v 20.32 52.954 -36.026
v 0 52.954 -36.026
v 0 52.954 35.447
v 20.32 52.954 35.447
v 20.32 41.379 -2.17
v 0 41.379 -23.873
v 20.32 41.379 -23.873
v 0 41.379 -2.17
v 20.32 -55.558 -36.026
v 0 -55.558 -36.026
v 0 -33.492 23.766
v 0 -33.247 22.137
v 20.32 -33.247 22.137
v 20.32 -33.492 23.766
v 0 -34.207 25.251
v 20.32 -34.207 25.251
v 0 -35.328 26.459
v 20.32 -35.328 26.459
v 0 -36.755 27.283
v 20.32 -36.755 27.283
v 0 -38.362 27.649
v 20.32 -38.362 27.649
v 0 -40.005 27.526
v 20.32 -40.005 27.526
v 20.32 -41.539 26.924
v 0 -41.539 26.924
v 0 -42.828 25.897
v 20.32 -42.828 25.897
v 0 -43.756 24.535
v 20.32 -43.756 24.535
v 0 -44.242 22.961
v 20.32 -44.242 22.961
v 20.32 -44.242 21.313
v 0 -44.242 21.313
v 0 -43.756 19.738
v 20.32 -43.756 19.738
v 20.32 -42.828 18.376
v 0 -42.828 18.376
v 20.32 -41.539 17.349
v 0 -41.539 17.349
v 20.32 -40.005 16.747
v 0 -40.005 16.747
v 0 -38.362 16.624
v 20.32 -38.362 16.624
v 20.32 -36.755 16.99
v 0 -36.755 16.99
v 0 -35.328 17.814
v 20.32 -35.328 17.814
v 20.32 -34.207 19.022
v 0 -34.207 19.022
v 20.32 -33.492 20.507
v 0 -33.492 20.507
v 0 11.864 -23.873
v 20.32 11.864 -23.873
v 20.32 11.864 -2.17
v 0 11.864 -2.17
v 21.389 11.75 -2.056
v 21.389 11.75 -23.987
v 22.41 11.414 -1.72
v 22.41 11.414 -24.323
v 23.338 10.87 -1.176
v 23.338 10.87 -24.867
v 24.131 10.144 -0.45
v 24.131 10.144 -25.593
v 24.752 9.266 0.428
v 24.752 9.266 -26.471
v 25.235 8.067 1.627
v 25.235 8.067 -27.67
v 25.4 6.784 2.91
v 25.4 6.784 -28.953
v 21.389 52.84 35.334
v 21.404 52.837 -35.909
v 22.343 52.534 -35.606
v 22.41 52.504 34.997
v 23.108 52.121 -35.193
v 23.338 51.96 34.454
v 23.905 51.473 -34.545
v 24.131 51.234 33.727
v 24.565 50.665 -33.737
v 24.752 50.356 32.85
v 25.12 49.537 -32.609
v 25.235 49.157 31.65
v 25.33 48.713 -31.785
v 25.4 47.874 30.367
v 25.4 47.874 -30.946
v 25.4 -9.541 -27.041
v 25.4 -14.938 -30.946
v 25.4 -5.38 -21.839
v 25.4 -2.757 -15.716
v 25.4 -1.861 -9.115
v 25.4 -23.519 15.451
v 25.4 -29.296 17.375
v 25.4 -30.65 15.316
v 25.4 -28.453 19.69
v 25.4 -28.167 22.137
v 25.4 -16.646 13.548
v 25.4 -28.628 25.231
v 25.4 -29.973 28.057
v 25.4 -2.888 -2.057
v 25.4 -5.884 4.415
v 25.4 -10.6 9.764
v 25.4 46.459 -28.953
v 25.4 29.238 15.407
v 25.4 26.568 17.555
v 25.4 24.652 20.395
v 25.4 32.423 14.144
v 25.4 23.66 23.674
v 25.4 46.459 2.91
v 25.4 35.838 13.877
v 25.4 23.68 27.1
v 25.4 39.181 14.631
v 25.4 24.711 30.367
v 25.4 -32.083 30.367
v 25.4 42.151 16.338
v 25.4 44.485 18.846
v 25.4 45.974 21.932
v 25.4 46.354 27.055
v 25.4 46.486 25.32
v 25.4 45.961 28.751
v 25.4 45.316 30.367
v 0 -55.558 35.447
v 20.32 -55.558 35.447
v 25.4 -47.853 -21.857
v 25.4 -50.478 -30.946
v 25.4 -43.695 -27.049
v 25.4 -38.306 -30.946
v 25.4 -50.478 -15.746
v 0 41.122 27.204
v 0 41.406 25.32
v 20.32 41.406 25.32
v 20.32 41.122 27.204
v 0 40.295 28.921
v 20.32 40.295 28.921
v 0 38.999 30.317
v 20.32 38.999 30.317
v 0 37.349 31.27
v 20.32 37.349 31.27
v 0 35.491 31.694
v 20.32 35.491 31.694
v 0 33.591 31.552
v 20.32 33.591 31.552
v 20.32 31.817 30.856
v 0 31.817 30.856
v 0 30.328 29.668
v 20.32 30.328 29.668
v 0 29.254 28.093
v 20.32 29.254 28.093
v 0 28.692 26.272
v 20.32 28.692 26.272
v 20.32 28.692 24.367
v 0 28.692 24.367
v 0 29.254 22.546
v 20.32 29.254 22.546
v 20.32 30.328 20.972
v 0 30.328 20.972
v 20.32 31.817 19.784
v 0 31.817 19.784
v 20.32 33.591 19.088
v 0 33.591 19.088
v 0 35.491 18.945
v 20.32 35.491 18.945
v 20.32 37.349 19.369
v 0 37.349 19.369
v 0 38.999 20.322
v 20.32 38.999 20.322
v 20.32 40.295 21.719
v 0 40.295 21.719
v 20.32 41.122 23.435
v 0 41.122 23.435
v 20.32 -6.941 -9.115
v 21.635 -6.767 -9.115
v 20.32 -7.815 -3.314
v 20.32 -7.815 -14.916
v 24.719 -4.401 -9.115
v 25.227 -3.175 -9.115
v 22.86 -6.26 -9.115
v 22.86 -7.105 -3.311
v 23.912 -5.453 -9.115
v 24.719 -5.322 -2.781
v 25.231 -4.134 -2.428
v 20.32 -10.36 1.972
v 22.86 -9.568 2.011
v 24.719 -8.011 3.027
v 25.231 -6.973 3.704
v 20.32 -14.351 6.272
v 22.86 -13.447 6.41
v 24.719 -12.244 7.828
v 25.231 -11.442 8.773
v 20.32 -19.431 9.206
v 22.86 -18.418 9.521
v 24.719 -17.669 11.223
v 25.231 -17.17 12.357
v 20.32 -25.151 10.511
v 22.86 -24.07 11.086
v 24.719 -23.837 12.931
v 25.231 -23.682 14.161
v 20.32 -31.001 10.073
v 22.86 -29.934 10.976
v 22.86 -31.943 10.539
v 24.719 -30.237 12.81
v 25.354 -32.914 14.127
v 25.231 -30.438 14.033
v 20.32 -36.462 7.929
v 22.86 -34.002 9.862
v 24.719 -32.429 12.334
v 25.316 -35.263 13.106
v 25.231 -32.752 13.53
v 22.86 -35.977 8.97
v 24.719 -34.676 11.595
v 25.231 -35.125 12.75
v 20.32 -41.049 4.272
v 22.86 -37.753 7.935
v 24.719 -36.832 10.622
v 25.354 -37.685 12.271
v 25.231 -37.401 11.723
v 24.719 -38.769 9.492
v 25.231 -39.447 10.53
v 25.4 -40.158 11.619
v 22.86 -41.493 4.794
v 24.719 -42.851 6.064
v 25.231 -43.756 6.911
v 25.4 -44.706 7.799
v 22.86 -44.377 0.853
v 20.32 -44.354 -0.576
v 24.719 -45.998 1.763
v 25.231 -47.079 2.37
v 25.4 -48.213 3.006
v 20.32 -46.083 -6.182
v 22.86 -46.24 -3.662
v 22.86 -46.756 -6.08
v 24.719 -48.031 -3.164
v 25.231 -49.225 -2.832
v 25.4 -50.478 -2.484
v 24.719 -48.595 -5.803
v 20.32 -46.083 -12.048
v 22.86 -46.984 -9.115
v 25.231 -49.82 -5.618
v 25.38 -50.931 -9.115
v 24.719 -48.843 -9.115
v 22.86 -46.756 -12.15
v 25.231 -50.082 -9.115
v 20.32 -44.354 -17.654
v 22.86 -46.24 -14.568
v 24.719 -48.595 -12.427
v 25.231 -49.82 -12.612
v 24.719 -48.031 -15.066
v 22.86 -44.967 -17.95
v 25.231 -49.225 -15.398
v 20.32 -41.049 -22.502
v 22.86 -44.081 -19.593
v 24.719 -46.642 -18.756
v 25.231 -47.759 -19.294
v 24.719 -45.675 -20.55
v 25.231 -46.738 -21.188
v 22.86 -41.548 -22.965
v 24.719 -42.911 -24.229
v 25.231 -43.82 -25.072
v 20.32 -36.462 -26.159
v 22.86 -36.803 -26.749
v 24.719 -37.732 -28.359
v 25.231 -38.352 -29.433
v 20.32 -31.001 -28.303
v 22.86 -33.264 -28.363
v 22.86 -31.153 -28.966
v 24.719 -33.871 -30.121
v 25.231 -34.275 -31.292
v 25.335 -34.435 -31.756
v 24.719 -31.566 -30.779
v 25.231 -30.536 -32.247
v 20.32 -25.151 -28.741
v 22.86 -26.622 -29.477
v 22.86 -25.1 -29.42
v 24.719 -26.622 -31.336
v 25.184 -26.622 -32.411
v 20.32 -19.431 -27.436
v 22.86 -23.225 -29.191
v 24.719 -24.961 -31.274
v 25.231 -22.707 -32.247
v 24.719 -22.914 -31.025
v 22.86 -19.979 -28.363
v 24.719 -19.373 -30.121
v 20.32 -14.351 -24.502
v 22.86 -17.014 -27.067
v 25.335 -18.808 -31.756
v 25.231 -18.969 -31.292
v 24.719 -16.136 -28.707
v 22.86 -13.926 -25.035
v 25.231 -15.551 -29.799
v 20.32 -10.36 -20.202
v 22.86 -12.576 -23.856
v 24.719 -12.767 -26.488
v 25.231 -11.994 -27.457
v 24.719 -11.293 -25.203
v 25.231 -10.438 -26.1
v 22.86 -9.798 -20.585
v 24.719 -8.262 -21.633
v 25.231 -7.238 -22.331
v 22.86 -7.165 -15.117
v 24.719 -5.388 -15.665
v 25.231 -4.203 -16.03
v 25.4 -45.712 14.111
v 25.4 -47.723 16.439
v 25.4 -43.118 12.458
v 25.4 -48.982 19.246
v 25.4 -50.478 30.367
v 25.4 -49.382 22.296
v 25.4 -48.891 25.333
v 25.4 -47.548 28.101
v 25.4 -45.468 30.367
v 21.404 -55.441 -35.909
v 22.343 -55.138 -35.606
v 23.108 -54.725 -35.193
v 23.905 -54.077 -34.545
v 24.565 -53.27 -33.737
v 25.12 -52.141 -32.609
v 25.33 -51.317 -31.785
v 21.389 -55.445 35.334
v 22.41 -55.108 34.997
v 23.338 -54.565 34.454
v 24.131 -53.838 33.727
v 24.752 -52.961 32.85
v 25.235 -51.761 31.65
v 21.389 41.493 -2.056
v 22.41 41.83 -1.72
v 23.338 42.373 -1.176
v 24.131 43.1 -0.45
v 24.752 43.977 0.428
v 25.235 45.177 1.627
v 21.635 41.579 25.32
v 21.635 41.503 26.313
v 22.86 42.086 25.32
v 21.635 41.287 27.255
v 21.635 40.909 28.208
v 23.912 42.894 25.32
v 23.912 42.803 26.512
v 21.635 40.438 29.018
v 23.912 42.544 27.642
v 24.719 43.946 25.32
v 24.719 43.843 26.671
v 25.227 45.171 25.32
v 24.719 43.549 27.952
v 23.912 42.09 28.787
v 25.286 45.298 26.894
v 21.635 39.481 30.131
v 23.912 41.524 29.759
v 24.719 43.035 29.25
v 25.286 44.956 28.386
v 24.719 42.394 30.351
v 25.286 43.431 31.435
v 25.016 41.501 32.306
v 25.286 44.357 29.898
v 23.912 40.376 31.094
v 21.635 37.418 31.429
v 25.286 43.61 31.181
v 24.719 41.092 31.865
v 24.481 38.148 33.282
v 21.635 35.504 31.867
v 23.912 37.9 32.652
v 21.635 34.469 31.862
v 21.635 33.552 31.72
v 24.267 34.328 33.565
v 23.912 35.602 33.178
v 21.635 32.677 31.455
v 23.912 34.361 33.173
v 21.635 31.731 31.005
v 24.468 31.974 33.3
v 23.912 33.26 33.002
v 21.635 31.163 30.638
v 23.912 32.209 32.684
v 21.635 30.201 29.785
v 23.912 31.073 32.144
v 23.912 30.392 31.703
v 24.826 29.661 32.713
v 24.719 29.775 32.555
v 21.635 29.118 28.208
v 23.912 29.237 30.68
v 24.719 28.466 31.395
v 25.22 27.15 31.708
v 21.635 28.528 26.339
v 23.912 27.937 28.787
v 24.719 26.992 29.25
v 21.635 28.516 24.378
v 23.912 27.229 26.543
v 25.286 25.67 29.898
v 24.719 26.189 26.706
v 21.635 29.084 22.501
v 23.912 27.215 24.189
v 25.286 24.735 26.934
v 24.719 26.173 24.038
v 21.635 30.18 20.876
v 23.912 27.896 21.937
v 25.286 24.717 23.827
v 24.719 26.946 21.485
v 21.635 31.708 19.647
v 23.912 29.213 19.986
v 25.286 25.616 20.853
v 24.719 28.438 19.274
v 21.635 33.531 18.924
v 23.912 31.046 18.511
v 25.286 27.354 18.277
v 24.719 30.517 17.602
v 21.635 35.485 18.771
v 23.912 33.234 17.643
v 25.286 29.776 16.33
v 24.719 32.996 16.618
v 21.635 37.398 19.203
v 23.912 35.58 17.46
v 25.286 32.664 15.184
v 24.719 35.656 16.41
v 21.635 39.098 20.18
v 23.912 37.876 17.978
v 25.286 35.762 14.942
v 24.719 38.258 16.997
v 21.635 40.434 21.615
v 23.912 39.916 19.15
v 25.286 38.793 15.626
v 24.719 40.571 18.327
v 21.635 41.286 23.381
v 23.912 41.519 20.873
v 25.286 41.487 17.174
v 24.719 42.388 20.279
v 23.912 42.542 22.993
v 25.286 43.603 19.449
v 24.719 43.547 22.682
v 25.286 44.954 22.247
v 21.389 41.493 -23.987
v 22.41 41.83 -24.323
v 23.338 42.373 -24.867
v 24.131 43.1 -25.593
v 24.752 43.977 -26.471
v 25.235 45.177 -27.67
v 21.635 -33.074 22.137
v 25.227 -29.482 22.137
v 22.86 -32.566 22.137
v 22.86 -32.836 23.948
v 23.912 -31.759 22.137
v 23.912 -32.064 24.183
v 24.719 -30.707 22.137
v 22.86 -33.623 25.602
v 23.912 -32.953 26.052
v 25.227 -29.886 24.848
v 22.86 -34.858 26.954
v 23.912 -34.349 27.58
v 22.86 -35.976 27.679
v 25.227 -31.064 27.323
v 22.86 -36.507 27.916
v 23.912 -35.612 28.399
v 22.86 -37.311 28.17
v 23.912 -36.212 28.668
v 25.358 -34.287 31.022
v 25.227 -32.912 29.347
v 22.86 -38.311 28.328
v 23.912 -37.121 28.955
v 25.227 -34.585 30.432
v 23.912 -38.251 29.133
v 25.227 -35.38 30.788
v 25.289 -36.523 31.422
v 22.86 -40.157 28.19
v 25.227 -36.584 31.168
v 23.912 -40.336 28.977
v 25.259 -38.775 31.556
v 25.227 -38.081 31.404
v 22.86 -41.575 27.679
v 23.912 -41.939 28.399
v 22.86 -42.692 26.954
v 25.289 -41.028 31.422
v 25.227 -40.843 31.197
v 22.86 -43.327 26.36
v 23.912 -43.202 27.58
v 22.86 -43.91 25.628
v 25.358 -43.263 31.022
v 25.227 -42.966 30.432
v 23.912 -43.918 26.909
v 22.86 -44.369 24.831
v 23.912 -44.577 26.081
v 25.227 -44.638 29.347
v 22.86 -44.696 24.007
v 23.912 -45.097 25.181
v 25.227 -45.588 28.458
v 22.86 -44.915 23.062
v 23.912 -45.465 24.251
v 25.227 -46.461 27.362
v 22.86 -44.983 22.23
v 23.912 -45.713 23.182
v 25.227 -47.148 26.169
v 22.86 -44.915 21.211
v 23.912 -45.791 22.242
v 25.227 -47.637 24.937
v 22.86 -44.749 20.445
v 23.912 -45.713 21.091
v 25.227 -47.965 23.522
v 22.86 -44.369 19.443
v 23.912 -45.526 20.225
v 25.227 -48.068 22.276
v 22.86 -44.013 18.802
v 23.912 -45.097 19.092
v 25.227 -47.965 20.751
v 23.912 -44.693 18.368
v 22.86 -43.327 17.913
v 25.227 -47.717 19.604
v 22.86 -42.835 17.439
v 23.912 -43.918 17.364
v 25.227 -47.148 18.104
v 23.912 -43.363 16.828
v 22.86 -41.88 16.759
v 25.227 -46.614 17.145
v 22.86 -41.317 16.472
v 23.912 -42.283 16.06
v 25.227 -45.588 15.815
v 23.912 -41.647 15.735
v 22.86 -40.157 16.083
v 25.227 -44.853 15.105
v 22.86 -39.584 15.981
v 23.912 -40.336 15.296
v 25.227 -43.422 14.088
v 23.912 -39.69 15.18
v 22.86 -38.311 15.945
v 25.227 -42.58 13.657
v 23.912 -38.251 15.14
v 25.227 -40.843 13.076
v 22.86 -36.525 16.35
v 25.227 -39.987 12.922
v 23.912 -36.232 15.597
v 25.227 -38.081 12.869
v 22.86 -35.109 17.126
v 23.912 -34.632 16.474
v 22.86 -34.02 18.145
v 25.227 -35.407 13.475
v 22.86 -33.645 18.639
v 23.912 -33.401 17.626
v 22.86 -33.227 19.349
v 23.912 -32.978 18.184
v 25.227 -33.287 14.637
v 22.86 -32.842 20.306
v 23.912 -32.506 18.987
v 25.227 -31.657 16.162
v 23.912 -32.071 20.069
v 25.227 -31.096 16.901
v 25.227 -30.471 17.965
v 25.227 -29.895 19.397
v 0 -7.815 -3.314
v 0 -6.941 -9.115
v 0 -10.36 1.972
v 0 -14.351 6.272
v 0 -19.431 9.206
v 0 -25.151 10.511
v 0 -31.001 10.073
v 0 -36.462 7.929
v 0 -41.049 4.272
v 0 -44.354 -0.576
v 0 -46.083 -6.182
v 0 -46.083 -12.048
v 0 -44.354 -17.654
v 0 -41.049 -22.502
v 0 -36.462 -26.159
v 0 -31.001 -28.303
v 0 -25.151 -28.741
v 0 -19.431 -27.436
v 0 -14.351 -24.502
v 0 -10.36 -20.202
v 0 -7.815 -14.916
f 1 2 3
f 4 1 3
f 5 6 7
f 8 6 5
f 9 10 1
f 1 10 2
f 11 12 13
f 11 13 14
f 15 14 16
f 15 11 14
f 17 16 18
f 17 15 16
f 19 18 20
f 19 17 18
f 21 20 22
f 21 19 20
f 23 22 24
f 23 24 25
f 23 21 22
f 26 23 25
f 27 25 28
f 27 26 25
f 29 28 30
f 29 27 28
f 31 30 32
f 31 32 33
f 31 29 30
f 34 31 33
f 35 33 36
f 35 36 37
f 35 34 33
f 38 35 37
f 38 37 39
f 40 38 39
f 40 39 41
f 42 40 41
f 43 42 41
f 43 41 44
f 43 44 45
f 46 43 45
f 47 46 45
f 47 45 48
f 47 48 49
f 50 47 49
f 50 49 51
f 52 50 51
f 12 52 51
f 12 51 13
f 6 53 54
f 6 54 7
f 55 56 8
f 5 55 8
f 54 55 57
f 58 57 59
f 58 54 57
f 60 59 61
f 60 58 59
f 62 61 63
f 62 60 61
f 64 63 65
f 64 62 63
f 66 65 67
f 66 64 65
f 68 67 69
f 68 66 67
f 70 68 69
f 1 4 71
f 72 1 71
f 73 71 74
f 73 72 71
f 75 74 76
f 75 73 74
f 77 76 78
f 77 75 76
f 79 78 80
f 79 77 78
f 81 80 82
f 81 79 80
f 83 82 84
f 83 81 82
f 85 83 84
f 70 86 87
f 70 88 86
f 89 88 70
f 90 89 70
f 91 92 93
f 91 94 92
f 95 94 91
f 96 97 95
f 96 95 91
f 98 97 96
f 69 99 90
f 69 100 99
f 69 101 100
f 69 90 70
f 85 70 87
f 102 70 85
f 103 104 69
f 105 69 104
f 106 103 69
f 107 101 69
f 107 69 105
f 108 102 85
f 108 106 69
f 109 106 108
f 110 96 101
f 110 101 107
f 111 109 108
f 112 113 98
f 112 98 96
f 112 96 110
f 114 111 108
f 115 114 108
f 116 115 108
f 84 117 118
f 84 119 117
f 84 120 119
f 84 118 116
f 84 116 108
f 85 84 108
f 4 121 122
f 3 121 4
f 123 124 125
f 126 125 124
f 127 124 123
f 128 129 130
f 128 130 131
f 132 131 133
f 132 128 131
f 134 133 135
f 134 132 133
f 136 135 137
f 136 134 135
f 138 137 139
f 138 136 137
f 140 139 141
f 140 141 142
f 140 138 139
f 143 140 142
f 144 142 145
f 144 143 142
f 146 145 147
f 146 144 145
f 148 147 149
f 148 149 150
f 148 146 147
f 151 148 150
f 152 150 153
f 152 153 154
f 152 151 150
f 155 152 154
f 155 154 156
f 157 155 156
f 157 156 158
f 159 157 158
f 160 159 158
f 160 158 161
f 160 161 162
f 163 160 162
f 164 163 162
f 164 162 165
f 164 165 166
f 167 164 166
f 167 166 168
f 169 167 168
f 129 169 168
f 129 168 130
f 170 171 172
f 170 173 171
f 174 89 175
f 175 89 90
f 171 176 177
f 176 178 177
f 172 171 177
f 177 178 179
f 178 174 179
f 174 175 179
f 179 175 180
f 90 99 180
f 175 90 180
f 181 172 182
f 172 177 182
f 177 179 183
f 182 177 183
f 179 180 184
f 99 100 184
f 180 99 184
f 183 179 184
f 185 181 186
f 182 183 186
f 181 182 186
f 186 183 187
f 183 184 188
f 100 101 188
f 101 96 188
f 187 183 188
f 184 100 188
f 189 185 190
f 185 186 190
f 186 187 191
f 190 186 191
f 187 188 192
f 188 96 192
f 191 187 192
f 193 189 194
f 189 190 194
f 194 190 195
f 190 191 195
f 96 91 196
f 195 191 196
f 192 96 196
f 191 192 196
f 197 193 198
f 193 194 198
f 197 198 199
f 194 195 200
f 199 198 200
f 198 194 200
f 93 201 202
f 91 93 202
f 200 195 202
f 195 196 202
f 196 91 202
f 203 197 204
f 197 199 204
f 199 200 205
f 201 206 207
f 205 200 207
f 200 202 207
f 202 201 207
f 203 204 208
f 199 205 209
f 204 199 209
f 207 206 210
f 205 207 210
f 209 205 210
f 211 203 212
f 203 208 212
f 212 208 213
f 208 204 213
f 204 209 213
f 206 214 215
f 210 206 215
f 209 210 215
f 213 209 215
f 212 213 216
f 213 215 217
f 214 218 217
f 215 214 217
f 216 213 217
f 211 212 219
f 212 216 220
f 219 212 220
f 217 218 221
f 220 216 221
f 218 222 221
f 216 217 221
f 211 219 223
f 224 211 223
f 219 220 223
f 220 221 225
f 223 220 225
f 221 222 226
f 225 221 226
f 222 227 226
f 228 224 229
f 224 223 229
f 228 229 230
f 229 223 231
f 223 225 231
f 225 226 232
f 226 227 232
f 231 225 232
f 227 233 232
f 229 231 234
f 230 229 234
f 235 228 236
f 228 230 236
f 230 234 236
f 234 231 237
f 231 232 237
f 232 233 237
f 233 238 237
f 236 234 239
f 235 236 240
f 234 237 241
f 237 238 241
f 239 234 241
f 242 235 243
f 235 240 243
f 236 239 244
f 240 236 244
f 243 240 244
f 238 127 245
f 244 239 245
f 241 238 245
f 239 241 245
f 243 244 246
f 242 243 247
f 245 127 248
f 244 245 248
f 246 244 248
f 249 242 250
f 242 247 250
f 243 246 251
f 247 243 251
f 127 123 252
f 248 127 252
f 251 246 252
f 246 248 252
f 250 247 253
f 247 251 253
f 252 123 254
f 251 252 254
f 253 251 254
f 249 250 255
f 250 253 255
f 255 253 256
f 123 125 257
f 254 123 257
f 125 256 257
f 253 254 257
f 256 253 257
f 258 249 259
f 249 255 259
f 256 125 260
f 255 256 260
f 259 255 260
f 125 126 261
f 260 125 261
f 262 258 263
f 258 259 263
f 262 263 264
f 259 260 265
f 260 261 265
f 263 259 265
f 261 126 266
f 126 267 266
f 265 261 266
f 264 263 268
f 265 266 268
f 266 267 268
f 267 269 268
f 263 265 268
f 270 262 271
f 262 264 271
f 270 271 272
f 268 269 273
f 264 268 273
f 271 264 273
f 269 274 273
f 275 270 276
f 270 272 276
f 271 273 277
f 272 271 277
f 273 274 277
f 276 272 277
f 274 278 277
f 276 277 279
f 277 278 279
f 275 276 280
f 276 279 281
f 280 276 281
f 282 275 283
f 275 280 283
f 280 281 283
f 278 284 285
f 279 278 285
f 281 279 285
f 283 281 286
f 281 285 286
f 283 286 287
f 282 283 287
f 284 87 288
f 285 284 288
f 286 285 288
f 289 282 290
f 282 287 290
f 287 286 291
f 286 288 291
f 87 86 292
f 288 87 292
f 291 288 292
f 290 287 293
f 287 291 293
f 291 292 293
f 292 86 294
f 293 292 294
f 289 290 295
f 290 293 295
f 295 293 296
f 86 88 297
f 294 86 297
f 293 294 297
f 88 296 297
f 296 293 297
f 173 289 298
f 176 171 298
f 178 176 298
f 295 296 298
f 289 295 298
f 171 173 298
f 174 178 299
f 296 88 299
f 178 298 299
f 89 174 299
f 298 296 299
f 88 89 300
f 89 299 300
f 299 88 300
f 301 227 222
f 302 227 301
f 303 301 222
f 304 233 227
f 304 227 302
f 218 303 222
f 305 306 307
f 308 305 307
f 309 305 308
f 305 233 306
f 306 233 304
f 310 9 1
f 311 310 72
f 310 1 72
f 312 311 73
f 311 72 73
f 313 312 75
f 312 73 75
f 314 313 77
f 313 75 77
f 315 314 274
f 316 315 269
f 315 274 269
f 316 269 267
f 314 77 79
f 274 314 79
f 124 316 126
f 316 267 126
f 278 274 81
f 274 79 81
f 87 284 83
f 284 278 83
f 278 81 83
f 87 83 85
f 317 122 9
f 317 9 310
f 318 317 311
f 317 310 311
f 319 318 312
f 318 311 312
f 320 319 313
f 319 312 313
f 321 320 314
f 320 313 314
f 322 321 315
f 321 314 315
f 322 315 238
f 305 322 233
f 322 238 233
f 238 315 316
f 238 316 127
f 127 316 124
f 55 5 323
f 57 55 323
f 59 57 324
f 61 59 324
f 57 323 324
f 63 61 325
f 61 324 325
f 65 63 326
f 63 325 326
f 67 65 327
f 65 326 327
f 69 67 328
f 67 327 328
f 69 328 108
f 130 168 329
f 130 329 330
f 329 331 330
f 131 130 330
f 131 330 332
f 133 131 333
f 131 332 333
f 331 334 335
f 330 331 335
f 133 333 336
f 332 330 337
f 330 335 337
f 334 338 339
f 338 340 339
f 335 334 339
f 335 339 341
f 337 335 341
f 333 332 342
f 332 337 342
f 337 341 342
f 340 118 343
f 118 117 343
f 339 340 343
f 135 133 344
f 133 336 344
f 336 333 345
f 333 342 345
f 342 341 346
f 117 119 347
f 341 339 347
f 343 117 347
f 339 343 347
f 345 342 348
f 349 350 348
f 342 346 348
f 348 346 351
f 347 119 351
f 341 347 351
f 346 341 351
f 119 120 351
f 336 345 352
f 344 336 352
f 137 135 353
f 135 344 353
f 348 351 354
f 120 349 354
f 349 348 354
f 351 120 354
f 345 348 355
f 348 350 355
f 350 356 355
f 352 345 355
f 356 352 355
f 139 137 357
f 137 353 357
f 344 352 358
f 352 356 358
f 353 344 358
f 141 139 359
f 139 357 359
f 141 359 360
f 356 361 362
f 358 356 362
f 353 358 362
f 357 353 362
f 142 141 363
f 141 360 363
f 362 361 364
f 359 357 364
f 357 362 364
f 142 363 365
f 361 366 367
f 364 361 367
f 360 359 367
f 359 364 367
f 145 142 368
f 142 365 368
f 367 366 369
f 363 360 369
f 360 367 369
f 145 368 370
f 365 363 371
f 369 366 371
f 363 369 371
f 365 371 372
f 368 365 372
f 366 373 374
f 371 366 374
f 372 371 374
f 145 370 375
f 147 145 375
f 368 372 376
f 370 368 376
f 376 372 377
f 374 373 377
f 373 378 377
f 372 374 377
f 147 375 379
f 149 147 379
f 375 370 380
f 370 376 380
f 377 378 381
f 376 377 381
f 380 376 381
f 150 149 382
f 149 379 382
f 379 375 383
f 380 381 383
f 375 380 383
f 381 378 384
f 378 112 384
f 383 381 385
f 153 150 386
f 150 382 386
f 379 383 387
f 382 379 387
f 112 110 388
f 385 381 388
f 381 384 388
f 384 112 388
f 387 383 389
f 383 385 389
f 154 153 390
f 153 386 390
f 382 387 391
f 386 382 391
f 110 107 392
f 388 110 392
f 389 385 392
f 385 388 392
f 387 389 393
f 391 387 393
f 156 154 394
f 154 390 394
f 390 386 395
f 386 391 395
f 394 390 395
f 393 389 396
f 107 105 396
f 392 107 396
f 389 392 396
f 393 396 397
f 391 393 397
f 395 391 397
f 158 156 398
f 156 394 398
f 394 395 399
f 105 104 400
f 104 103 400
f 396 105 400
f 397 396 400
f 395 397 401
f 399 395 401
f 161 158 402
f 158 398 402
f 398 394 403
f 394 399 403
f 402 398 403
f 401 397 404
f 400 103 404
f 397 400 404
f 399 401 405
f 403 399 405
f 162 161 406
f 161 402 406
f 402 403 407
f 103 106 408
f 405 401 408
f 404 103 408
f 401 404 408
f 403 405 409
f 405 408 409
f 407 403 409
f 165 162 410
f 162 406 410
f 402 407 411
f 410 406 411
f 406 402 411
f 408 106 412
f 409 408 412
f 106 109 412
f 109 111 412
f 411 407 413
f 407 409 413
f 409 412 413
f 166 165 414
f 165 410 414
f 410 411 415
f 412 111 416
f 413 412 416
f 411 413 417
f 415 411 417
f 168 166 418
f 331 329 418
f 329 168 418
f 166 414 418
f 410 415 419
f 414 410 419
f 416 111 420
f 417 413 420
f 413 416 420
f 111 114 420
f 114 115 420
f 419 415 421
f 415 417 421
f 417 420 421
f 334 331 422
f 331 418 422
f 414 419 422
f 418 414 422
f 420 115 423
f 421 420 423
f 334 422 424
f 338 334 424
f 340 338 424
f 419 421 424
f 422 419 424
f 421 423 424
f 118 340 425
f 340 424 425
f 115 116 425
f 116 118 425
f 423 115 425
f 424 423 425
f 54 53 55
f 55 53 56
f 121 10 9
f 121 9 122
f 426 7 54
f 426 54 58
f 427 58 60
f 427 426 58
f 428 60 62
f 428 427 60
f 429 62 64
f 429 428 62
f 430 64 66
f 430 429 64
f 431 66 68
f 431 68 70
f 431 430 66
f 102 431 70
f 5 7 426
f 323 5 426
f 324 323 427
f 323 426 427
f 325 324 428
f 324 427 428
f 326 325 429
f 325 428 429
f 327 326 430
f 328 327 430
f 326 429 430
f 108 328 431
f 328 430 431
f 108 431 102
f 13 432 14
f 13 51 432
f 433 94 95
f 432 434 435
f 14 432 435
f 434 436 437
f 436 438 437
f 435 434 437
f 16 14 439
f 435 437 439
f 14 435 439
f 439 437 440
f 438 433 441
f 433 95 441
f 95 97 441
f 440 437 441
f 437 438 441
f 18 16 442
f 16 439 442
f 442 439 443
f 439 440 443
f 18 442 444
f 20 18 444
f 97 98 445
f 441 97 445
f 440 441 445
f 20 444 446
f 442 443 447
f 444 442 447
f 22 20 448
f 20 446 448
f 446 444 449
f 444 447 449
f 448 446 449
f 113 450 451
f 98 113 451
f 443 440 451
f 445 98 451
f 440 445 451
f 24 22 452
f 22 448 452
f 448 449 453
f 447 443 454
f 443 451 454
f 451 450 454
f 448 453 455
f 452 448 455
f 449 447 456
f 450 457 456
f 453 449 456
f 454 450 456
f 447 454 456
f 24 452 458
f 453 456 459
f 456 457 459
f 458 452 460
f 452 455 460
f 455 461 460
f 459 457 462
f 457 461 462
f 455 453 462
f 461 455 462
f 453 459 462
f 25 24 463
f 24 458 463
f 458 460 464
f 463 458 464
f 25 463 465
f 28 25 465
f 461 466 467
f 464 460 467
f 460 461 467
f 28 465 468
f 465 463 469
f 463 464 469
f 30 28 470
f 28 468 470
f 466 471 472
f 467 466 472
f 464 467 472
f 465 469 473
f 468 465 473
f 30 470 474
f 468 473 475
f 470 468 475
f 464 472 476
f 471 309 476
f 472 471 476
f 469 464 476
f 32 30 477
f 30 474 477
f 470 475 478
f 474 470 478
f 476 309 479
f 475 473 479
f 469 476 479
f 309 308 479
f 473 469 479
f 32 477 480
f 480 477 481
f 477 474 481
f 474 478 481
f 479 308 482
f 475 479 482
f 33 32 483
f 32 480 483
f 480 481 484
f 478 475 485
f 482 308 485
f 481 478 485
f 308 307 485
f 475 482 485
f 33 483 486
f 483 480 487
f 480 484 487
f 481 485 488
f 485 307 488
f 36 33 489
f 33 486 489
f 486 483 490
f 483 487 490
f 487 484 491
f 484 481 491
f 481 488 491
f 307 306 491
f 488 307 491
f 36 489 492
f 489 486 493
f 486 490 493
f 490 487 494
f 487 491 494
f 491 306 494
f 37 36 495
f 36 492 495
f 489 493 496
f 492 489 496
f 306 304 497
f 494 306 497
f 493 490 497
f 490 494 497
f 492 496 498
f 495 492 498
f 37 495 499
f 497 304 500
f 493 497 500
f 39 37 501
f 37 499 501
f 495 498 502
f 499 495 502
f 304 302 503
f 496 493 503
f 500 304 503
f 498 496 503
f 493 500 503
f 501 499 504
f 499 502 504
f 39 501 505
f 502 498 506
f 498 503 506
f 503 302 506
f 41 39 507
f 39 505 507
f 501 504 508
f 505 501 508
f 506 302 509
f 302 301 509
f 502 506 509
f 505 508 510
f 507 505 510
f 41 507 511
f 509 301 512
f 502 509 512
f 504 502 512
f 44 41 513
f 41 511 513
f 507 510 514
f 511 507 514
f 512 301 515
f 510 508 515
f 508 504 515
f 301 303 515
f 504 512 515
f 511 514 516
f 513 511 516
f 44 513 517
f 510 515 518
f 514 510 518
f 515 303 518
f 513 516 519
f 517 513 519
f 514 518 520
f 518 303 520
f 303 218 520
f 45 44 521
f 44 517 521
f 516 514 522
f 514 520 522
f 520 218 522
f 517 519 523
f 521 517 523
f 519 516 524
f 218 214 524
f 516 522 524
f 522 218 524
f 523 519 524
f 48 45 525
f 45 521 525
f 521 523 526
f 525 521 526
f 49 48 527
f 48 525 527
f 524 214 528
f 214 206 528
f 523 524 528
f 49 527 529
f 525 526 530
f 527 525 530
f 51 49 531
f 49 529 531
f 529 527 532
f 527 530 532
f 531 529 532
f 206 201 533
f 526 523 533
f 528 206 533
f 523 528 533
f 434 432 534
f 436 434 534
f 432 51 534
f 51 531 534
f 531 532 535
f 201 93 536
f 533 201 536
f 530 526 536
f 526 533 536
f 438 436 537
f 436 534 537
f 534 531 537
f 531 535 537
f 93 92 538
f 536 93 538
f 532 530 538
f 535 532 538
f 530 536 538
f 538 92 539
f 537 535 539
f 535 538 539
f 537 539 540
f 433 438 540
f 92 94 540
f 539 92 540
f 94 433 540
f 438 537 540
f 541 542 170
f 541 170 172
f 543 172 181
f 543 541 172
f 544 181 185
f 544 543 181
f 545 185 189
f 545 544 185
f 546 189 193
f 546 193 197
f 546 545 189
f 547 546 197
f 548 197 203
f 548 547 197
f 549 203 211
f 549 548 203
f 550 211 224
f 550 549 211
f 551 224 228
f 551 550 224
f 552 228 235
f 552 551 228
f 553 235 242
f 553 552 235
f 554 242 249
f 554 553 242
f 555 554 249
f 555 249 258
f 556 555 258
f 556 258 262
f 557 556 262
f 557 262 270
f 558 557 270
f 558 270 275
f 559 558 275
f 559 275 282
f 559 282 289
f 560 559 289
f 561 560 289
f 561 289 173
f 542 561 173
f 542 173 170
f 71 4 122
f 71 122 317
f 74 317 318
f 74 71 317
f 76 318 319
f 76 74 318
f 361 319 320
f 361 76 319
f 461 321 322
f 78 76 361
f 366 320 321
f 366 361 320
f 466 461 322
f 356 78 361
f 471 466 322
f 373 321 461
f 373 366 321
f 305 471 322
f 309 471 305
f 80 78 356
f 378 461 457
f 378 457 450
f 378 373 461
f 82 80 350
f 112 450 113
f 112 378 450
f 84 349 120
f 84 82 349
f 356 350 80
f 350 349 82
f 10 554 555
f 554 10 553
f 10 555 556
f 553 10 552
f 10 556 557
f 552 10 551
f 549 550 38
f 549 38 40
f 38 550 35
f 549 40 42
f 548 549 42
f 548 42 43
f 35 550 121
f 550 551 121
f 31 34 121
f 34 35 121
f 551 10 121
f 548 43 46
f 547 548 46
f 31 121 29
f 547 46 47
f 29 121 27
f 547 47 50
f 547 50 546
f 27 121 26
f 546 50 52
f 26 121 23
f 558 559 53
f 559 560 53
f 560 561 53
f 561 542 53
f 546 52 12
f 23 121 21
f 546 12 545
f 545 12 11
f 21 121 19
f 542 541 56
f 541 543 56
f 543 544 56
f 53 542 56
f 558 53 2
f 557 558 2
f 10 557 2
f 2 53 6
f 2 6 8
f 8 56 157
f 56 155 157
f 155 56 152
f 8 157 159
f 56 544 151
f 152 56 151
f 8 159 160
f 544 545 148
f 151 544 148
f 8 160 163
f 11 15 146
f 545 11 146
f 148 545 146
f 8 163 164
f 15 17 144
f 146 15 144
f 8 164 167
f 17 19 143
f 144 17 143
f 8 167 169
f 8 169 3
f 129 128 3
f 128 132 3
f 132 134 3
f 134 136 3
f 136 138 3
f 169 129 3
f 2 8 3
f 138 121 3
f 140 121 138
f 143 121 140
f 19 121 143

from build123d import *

# Parameters (mm, degrees)
F0_W         = 108.5126549006
F0_H         = 71.473672986
F0_R         = 19.6812167499
F0_W_2       = 29.5154461637
F0_H_2       = 21.7025321908
F0_R_2       = 5.5283506547
F0_R_3       = 6.3923279955
F1_DEPTH     = 25.4
F2_T1_DEPTH  = 29.5154461637
F2_T3_DEPTH  = 133.9126549006
F2_T5_DEPTH  = 96.873672986
F2_T7_DEPTH  = 21.7025321908
F2_T19_DEPTH = 34.4025321908
F2_T23_DEPTH = 42.2154461637
F2_T30_DEPTH = 42.2154461637
F2_T34_DEPTH = 34.4025321908
F2_T41_DEPTH = 34.4025321908
F2_T45_DEPTH = 42.2154461637
F2_T52_DEPTH = 34.4025321908
F2_T56_DEPTH = 42.2154461637


# Not quite as in the source:
# - a fillet or chamfer that OpenCascade refuses, or shapes differently, is made with other operations: its cross-section is extruded or revolved along the edge and cut away or added


with BuildPart() as f1:
    # F0 (on Right) → F1 (new body)
    with BuildSketch(Plane.YZ):
        with Locations((-1.3021528721, -0.2893656492)):
            Rectangle(F0_W, F0_H)
        with Locations((-26.6217719764, -9.1150635853)):
            Circle(F0_R, mode=Mode.SUBTRACT)
        with Locations((26.6217733733, -13.0215191748)):
            Rectangle(F0_W_2, F0_H_2, mode=Mode.SUBTRACT)
        with Locations((-38.775190711, 22.1365820616)):
            Circle(F0_R_2, mode=Mode.SUBTRACT)
        with Locations((35.01342237, 25.3196209669)):
            Circle(F0_R_3, mode=Mode.SUBTRACT)
    extrude(amount=F1_DEPTH)

    # F2: fillet of radius 5.08 on 11 edges, made by hand

    # F2_s2 → F2_t1 (cut)
    with BuildSketch(Plane.XZ.offset(-41.3794964552)):
        with BuildLine():
            ThreePointArc((20.32, -2.1702530794), (23.9121024484, -0.6823555278), (25.4, 2.9097469206))
            Line((25.4, 2.9097469206), (25.4, -2.1702530794))
            Line((25.4, -2.1702530794), (20.32, -2.1702530794))
        make_face()
        with BuildLine():
            ThreePointArc((20.32, -23.8727852702), (23.9121024484, -25.3606828218), (25.4, -28.9527852702))
            Line((25.4, -28.9527852702), (25.4, -23.8727852702))
            Line((25.4, -23.8727852702), (20.32, -23.8727852702))
        make_face()
    extrude(amount=F2_T1_DEPTH, mode=Mode.SUBTRACT)

    # F2_s4 → F2_t3 (cut)
    with BuildSketch(Plane.XZ.offset(-65.6541745782)):
        with BuildLine():
            ThreePointArc((20.32, 35.4474708438), (23.9121024484, 33.9595732922), (25.4, 30.3674708438))
            Line((25.4, 30.3674708438), (25.4, 35.4474708438))
            Line((25.4, 35.4474708438), (20.32, 35.4474708438))
        make_face()
        with BuildLine():
            ThreePointArc((20.32, -36.0262021422), (23.9121024484, -34.5383045907), (25.4, -30.9462021422))
            Line((25.4, -30.9462021422), (25.4, -36.0262021422))
            Line((25.4, -36.0262021422), (20.32, -36.0262021422))
        make_face()
    extrude(amount=F2_T3_DEPTH, mode=Mode.SUBTRACT)

    # F2_s6 → F2_t5 (cut)
    with BuildSketch(Plane.XY.offset(-48.7262021422)):
        with BuildLine():
            ThreePointArc((20.32, -55.5584803224), (23.9121024484, -54.0705827708), (25.4, -50.4784803224))
            Line((25.4, -50.4784803224), (25.4, -55.5584803224))
            Line((25.4, -55.5584803224), (20.32, -55.5584803224))
        make_face()
        with BuildLine():
            ThreePointArc((20.32, 52.9541745782), (23.9121024484, 51.4662770266), (25.4, 47.8741745782))
            Line((25.4, 47.8741745782), (25.4, 52.9541745782))
            Line((25.4, 52.9541745782), (20.32, 52.9541745782))
        make_face()
    extrude(amount=F2_T5_DEPTH, mode=Mode.SUBTRACT)

    # F2_s8 → F2_t7 (cut)
    with BuildSketch(Plane.XY.offset(-23.8727852702)):
        with BuildLine():
            ThreePointArc((20.32, 11.8640502915), (23.9121024484, 10.3761527399), (25.4, 6.7840502915))
            Line((25.4, 6.7840502915), (25.4, 11.8640502915))
            Line((25.4, 11.8640502915), (20.32, 11.8640502915))
        make_face()
        with BuildLine():
            ThreePointArc((20.32, 41.3794964552), (23.9121024484, 42.8673940068), (25.4, 46.4594964552))
            Line((25.4, 46.4594964552), (25.4, 41.3794964552))
            Line((25.4, 41.3794964552), (20.32, 41.3794964552))
        make_face()
    extrude(amount=F2_T7_DEPTH, mode=Mode.SUBTRACT)

    # F2_s9 → F2_t10 (revolve, cut)
    with BuildSketch(Plane.XY.offset(-9.1150635853)):
        with BuildLine():
            ThreePointArc((20.32, -6.9405552264), (23.9121024484, -5.4526576749), (25.4, -1.8605552264))
            Line((25.4, -1.8605552264), (25.4, -6.9405552264))
            Line((25.4, -6.9405552264), (20.32, -6.9405552264))
        make_face()
    revolve(axis=Axis((25.4, -26.6217719764, -9.1150635853), (1, 0, 0)), mode=Mode.SUBTRACT)

    # F2_s11 → F2_t12 (revolve, cut)
    with BuildSketch(Plane.XY.offset(22.1365820616)):
        with BuildLine():
            ThreePointArc((20.32, -33.2468400563), (23.9121024484, -31.7589425047), (25.4, -28.1668400563))
            Line((25.4, -28.1668400563), (25.4, -33.2468400563))
            Line((25.4, -33.2468400563), (20.32, -33.2468400563))
        make_face()
    revolve(axis=Axis((25.4, -38.775190711, 22.1365820616), (1, 0, 0)), mode=Mode.SUBTRACT)

    # F2_s13 → F2_t14 (revolve, cut)
    with BuildSketch(Plane.XY.offset(25.3196209669)):
        with BuildLine():
            ThreePointArc((20.32, 41.4057503654), (23.9121024484, 42.893647917), (25.4, 46.4857503654))
            Line((25.4, 46.4857503654), (25.4, 41.4057503654))
            Line((25.4, 41.4057503654), (20.32, 41.4057503654))
        make_face()
    revolve(axis=Axis((25.4, 35.01342237, 25.3196209669), (1, 0, 0)), mode=Mode.SUBTRACT)


with BuildPart() as f2_tool17:
    # F2_s18 → F2_t19 (new body)
    with BuildSketch(Plane.XY.offset(-23.8727852702)):
        with BuildLine():
            ThreePointArc((20.32, 11.8640502915), (23.9121024484, 10.3761527399), (25.4, 6.7840502915))
            Line((25.4, 6.7840502915), (25.4, 11.8640502915))
            Line((25.4, 11.8640502915), (20.32, 11.8640502915))
        make_face()
    extrude(amount=F2_T19_DEPTH)

    split(bisect_by=Plane.XY.offset(-2.1702530794), keep=Keep.TOP)


with BuildPart() as f2_tool21:
    # F2_s22 → F2_t23 (new body)
    with BuildSketch(Plane.XZ.offset(0.8359497085)):
        with BuildLine():
            ThreePointArc((20.32, -2.1702530794), (23.9121024484, -0.6823555278), (25.4, 2.9097469206))
            Line((25.4, 2.9097469206), (25.4, -2.1702530794))
            Line((25.4, -2.1702530794), (20.32, -2.1702530794))
        make_face()
    extrude(amount=-F2_T23_DEPTH)

    split(bisect_by=Plane.XZ.offset(-11.8640502915), keep=Keep.TOP)


with BuildPart() as f2_tool17_1:
    add(f2_tool17.part)

    # F2_t25: intersect F2_tool21
    add(f2_tool21.part, mode=Mode.INTERSECT)


with BuildPart() as f1_1:
    add(f1.part)

    # F2_t15: cut F2_tool17
    add(f2_tool17_1.part, mode=Mode.SUBTRACT)


with BuildPart() as f2_tool28:
    # F2_s29 → F2_t30 (new body)
    with BuildSketch(Plane.XZ.offset(-11.8640502915)):
        with BuildLine():
            ThreePointArc((20.32, -2.1702530794), (23.9121024484, -0.6823555278), (25.4, 2.9097469206))
            Line((25.4, 2.9097469206), (25.4, -2.1702530794))
            Line((25.4, -2.1702530794), (20.32, -2.1702530794))
        make_face()
    extrude(amount=-F2_T30_DEPTH)

    split(bisect_by=Plane.XZ.offset(-41.3794964552), keep=Keep.BOTTOM)


with BuildPart() as f2_tool32:
    # F2_s33 → F2_t34 (new body)
    with BuildSketch(Plane.XY.offset(10.5297469206)):
        with BuildLine():
            ThreePointArc((20.32, 41.3794964552), (23.9121024484, 42.8673940068), (25.4, 46.4594964552))
            Line((25.4, 46.4594964552), (25.4, 41.3794964552))
            Line((25.4, 41.3794964552), (20.32, 41.3794964552))
        make_face()
    extrude(amount=-F2_T34_DEPTH)

    split(bisect_by=Plane.XY.offset(-2.1702530794), keep=Keep.TOP)


with BuildPart() as f2_tool28_1:
    add(f2_tool28.part)

    # F2_t36: intersect F2_tool32
    add(f2_tool32.part, mode=Mode.INTERSECT)


with BuildPart() as f1_2:
    add(f1_1.part)

    # F2_t26: cut F2_tool28
    add(f2_tool28_1.part, mode=Mode.SUBTRACT)


with BuildPart() as f2_tool39:
    # F2_s40 → F2_t41 (new body)
    with BuildSketch(Plane.XY.offset(-36.5727852702)):
        with BuildLine():
            ThreePointArc((20.32, 11.8640502915), (23.9121024484, 10.3761527399), (25.4, 6.7840502915))
            Line((25.4, 6.7840502915), (25.4, 11.8640502915))
            Line((25.4, 11.8640502915), (20.32, 11.8640502915))
        make_face()
    extrude(amount=F2_T41_DEPTH)

    split(bisect_by=Plane.XY.offset(-23.8727852702), keep=Keep.BOTTOM)


with BuildPart() as f2_tool43:
    # F2_s44 → F2_t45 (new body)
    with BuildSketch(Plane.XZ.offset(-41.3794964552)):
        with BuildLine():
            ThreePointArc((20.32, -23.8727852702), (23.9121024484, -25.3606828218), (25.4, -28.9527852702))
            Line((25.4, -28.9527852702), (25.4, -23.8727852702))
            Line((25.4, -23.8727852702), (20.32, -23.8727852702))
        make_face()
    extrude(amount=F2_T45_DEPTH)

    split(bisect_by=Plane.XZ.offset(-11.8640502915), keep=Keep.TOP)


with BuildPart() as f2_tool39_1:
    add(f2_tool39.part)

    # F2_t47: intersect F2_tool43
    add(f2_tool43.part, mode=Mode.INTERSECT)


with BuildPart() as f1_3:
    add(f1_2.part)

    # F2_t37: cut F2_tool39
    add(f2_tool39_1.part, mode=Mode.SUBTRACT)


with BuildPart() as f2_tool50:
    # F2_s51 → F2_t52 (new body)
    with BuildSketch(Plane.XY.offset(-2.1702530794)):
        with BuildLine():
            ThreePointArc((20.32, 41.3794964552), (23.9121024484, 42.8673940068), (25.4, 46.4594964552))
            Line((25.4, 46.4594964552), (25.4, 41.3794964552))
            Line((25.4, 41.3794964552), (20.32, 41.3794964552))
        make_face()
    extrude(amount=-F2_T52_DEPTH)

    split(bisect_by=Plane.XY.offset(-23.8727852702), keep=Keep.BOTTOM)


with BuildPart() as f2_tool54:
    # F2_s55 → F2_t56 (new body)
    with BuildSketch(Plane.XZ.offset(-54.0794964552)):
        with BuildLine():
            ThreePointArc((20.32, -23.8727852702), (23.9121024484, -25.3606828218), (25.4, -28.9527852702))
            Line((25.4, -28.9527852702), (25.4, -23.8727852702))
            Line((25.4, -23.8727852702), (20.32, -23.8727852702))
        make_face()
    extrude(amount=F2_T56_DEPTH)

    split(bisect_by=Plane.XZ.offset(-41.3794964552), keep=Keep.BOTTOM)


with BuildPart() as f2_tool50_1:
    add(f2_tool50.part)

    # F2_t58: intersect F2_tool54
    add(f2_tool54.part, mode=Mode.INTERSECT)


with BuildPart() as f1_4:
    add(f1_3.part)

    # F2_t48: cut F2_tool50
    add(f2_tool50_1.part, mode=Mode.SUBTRACT)


solid = f1_4.part
